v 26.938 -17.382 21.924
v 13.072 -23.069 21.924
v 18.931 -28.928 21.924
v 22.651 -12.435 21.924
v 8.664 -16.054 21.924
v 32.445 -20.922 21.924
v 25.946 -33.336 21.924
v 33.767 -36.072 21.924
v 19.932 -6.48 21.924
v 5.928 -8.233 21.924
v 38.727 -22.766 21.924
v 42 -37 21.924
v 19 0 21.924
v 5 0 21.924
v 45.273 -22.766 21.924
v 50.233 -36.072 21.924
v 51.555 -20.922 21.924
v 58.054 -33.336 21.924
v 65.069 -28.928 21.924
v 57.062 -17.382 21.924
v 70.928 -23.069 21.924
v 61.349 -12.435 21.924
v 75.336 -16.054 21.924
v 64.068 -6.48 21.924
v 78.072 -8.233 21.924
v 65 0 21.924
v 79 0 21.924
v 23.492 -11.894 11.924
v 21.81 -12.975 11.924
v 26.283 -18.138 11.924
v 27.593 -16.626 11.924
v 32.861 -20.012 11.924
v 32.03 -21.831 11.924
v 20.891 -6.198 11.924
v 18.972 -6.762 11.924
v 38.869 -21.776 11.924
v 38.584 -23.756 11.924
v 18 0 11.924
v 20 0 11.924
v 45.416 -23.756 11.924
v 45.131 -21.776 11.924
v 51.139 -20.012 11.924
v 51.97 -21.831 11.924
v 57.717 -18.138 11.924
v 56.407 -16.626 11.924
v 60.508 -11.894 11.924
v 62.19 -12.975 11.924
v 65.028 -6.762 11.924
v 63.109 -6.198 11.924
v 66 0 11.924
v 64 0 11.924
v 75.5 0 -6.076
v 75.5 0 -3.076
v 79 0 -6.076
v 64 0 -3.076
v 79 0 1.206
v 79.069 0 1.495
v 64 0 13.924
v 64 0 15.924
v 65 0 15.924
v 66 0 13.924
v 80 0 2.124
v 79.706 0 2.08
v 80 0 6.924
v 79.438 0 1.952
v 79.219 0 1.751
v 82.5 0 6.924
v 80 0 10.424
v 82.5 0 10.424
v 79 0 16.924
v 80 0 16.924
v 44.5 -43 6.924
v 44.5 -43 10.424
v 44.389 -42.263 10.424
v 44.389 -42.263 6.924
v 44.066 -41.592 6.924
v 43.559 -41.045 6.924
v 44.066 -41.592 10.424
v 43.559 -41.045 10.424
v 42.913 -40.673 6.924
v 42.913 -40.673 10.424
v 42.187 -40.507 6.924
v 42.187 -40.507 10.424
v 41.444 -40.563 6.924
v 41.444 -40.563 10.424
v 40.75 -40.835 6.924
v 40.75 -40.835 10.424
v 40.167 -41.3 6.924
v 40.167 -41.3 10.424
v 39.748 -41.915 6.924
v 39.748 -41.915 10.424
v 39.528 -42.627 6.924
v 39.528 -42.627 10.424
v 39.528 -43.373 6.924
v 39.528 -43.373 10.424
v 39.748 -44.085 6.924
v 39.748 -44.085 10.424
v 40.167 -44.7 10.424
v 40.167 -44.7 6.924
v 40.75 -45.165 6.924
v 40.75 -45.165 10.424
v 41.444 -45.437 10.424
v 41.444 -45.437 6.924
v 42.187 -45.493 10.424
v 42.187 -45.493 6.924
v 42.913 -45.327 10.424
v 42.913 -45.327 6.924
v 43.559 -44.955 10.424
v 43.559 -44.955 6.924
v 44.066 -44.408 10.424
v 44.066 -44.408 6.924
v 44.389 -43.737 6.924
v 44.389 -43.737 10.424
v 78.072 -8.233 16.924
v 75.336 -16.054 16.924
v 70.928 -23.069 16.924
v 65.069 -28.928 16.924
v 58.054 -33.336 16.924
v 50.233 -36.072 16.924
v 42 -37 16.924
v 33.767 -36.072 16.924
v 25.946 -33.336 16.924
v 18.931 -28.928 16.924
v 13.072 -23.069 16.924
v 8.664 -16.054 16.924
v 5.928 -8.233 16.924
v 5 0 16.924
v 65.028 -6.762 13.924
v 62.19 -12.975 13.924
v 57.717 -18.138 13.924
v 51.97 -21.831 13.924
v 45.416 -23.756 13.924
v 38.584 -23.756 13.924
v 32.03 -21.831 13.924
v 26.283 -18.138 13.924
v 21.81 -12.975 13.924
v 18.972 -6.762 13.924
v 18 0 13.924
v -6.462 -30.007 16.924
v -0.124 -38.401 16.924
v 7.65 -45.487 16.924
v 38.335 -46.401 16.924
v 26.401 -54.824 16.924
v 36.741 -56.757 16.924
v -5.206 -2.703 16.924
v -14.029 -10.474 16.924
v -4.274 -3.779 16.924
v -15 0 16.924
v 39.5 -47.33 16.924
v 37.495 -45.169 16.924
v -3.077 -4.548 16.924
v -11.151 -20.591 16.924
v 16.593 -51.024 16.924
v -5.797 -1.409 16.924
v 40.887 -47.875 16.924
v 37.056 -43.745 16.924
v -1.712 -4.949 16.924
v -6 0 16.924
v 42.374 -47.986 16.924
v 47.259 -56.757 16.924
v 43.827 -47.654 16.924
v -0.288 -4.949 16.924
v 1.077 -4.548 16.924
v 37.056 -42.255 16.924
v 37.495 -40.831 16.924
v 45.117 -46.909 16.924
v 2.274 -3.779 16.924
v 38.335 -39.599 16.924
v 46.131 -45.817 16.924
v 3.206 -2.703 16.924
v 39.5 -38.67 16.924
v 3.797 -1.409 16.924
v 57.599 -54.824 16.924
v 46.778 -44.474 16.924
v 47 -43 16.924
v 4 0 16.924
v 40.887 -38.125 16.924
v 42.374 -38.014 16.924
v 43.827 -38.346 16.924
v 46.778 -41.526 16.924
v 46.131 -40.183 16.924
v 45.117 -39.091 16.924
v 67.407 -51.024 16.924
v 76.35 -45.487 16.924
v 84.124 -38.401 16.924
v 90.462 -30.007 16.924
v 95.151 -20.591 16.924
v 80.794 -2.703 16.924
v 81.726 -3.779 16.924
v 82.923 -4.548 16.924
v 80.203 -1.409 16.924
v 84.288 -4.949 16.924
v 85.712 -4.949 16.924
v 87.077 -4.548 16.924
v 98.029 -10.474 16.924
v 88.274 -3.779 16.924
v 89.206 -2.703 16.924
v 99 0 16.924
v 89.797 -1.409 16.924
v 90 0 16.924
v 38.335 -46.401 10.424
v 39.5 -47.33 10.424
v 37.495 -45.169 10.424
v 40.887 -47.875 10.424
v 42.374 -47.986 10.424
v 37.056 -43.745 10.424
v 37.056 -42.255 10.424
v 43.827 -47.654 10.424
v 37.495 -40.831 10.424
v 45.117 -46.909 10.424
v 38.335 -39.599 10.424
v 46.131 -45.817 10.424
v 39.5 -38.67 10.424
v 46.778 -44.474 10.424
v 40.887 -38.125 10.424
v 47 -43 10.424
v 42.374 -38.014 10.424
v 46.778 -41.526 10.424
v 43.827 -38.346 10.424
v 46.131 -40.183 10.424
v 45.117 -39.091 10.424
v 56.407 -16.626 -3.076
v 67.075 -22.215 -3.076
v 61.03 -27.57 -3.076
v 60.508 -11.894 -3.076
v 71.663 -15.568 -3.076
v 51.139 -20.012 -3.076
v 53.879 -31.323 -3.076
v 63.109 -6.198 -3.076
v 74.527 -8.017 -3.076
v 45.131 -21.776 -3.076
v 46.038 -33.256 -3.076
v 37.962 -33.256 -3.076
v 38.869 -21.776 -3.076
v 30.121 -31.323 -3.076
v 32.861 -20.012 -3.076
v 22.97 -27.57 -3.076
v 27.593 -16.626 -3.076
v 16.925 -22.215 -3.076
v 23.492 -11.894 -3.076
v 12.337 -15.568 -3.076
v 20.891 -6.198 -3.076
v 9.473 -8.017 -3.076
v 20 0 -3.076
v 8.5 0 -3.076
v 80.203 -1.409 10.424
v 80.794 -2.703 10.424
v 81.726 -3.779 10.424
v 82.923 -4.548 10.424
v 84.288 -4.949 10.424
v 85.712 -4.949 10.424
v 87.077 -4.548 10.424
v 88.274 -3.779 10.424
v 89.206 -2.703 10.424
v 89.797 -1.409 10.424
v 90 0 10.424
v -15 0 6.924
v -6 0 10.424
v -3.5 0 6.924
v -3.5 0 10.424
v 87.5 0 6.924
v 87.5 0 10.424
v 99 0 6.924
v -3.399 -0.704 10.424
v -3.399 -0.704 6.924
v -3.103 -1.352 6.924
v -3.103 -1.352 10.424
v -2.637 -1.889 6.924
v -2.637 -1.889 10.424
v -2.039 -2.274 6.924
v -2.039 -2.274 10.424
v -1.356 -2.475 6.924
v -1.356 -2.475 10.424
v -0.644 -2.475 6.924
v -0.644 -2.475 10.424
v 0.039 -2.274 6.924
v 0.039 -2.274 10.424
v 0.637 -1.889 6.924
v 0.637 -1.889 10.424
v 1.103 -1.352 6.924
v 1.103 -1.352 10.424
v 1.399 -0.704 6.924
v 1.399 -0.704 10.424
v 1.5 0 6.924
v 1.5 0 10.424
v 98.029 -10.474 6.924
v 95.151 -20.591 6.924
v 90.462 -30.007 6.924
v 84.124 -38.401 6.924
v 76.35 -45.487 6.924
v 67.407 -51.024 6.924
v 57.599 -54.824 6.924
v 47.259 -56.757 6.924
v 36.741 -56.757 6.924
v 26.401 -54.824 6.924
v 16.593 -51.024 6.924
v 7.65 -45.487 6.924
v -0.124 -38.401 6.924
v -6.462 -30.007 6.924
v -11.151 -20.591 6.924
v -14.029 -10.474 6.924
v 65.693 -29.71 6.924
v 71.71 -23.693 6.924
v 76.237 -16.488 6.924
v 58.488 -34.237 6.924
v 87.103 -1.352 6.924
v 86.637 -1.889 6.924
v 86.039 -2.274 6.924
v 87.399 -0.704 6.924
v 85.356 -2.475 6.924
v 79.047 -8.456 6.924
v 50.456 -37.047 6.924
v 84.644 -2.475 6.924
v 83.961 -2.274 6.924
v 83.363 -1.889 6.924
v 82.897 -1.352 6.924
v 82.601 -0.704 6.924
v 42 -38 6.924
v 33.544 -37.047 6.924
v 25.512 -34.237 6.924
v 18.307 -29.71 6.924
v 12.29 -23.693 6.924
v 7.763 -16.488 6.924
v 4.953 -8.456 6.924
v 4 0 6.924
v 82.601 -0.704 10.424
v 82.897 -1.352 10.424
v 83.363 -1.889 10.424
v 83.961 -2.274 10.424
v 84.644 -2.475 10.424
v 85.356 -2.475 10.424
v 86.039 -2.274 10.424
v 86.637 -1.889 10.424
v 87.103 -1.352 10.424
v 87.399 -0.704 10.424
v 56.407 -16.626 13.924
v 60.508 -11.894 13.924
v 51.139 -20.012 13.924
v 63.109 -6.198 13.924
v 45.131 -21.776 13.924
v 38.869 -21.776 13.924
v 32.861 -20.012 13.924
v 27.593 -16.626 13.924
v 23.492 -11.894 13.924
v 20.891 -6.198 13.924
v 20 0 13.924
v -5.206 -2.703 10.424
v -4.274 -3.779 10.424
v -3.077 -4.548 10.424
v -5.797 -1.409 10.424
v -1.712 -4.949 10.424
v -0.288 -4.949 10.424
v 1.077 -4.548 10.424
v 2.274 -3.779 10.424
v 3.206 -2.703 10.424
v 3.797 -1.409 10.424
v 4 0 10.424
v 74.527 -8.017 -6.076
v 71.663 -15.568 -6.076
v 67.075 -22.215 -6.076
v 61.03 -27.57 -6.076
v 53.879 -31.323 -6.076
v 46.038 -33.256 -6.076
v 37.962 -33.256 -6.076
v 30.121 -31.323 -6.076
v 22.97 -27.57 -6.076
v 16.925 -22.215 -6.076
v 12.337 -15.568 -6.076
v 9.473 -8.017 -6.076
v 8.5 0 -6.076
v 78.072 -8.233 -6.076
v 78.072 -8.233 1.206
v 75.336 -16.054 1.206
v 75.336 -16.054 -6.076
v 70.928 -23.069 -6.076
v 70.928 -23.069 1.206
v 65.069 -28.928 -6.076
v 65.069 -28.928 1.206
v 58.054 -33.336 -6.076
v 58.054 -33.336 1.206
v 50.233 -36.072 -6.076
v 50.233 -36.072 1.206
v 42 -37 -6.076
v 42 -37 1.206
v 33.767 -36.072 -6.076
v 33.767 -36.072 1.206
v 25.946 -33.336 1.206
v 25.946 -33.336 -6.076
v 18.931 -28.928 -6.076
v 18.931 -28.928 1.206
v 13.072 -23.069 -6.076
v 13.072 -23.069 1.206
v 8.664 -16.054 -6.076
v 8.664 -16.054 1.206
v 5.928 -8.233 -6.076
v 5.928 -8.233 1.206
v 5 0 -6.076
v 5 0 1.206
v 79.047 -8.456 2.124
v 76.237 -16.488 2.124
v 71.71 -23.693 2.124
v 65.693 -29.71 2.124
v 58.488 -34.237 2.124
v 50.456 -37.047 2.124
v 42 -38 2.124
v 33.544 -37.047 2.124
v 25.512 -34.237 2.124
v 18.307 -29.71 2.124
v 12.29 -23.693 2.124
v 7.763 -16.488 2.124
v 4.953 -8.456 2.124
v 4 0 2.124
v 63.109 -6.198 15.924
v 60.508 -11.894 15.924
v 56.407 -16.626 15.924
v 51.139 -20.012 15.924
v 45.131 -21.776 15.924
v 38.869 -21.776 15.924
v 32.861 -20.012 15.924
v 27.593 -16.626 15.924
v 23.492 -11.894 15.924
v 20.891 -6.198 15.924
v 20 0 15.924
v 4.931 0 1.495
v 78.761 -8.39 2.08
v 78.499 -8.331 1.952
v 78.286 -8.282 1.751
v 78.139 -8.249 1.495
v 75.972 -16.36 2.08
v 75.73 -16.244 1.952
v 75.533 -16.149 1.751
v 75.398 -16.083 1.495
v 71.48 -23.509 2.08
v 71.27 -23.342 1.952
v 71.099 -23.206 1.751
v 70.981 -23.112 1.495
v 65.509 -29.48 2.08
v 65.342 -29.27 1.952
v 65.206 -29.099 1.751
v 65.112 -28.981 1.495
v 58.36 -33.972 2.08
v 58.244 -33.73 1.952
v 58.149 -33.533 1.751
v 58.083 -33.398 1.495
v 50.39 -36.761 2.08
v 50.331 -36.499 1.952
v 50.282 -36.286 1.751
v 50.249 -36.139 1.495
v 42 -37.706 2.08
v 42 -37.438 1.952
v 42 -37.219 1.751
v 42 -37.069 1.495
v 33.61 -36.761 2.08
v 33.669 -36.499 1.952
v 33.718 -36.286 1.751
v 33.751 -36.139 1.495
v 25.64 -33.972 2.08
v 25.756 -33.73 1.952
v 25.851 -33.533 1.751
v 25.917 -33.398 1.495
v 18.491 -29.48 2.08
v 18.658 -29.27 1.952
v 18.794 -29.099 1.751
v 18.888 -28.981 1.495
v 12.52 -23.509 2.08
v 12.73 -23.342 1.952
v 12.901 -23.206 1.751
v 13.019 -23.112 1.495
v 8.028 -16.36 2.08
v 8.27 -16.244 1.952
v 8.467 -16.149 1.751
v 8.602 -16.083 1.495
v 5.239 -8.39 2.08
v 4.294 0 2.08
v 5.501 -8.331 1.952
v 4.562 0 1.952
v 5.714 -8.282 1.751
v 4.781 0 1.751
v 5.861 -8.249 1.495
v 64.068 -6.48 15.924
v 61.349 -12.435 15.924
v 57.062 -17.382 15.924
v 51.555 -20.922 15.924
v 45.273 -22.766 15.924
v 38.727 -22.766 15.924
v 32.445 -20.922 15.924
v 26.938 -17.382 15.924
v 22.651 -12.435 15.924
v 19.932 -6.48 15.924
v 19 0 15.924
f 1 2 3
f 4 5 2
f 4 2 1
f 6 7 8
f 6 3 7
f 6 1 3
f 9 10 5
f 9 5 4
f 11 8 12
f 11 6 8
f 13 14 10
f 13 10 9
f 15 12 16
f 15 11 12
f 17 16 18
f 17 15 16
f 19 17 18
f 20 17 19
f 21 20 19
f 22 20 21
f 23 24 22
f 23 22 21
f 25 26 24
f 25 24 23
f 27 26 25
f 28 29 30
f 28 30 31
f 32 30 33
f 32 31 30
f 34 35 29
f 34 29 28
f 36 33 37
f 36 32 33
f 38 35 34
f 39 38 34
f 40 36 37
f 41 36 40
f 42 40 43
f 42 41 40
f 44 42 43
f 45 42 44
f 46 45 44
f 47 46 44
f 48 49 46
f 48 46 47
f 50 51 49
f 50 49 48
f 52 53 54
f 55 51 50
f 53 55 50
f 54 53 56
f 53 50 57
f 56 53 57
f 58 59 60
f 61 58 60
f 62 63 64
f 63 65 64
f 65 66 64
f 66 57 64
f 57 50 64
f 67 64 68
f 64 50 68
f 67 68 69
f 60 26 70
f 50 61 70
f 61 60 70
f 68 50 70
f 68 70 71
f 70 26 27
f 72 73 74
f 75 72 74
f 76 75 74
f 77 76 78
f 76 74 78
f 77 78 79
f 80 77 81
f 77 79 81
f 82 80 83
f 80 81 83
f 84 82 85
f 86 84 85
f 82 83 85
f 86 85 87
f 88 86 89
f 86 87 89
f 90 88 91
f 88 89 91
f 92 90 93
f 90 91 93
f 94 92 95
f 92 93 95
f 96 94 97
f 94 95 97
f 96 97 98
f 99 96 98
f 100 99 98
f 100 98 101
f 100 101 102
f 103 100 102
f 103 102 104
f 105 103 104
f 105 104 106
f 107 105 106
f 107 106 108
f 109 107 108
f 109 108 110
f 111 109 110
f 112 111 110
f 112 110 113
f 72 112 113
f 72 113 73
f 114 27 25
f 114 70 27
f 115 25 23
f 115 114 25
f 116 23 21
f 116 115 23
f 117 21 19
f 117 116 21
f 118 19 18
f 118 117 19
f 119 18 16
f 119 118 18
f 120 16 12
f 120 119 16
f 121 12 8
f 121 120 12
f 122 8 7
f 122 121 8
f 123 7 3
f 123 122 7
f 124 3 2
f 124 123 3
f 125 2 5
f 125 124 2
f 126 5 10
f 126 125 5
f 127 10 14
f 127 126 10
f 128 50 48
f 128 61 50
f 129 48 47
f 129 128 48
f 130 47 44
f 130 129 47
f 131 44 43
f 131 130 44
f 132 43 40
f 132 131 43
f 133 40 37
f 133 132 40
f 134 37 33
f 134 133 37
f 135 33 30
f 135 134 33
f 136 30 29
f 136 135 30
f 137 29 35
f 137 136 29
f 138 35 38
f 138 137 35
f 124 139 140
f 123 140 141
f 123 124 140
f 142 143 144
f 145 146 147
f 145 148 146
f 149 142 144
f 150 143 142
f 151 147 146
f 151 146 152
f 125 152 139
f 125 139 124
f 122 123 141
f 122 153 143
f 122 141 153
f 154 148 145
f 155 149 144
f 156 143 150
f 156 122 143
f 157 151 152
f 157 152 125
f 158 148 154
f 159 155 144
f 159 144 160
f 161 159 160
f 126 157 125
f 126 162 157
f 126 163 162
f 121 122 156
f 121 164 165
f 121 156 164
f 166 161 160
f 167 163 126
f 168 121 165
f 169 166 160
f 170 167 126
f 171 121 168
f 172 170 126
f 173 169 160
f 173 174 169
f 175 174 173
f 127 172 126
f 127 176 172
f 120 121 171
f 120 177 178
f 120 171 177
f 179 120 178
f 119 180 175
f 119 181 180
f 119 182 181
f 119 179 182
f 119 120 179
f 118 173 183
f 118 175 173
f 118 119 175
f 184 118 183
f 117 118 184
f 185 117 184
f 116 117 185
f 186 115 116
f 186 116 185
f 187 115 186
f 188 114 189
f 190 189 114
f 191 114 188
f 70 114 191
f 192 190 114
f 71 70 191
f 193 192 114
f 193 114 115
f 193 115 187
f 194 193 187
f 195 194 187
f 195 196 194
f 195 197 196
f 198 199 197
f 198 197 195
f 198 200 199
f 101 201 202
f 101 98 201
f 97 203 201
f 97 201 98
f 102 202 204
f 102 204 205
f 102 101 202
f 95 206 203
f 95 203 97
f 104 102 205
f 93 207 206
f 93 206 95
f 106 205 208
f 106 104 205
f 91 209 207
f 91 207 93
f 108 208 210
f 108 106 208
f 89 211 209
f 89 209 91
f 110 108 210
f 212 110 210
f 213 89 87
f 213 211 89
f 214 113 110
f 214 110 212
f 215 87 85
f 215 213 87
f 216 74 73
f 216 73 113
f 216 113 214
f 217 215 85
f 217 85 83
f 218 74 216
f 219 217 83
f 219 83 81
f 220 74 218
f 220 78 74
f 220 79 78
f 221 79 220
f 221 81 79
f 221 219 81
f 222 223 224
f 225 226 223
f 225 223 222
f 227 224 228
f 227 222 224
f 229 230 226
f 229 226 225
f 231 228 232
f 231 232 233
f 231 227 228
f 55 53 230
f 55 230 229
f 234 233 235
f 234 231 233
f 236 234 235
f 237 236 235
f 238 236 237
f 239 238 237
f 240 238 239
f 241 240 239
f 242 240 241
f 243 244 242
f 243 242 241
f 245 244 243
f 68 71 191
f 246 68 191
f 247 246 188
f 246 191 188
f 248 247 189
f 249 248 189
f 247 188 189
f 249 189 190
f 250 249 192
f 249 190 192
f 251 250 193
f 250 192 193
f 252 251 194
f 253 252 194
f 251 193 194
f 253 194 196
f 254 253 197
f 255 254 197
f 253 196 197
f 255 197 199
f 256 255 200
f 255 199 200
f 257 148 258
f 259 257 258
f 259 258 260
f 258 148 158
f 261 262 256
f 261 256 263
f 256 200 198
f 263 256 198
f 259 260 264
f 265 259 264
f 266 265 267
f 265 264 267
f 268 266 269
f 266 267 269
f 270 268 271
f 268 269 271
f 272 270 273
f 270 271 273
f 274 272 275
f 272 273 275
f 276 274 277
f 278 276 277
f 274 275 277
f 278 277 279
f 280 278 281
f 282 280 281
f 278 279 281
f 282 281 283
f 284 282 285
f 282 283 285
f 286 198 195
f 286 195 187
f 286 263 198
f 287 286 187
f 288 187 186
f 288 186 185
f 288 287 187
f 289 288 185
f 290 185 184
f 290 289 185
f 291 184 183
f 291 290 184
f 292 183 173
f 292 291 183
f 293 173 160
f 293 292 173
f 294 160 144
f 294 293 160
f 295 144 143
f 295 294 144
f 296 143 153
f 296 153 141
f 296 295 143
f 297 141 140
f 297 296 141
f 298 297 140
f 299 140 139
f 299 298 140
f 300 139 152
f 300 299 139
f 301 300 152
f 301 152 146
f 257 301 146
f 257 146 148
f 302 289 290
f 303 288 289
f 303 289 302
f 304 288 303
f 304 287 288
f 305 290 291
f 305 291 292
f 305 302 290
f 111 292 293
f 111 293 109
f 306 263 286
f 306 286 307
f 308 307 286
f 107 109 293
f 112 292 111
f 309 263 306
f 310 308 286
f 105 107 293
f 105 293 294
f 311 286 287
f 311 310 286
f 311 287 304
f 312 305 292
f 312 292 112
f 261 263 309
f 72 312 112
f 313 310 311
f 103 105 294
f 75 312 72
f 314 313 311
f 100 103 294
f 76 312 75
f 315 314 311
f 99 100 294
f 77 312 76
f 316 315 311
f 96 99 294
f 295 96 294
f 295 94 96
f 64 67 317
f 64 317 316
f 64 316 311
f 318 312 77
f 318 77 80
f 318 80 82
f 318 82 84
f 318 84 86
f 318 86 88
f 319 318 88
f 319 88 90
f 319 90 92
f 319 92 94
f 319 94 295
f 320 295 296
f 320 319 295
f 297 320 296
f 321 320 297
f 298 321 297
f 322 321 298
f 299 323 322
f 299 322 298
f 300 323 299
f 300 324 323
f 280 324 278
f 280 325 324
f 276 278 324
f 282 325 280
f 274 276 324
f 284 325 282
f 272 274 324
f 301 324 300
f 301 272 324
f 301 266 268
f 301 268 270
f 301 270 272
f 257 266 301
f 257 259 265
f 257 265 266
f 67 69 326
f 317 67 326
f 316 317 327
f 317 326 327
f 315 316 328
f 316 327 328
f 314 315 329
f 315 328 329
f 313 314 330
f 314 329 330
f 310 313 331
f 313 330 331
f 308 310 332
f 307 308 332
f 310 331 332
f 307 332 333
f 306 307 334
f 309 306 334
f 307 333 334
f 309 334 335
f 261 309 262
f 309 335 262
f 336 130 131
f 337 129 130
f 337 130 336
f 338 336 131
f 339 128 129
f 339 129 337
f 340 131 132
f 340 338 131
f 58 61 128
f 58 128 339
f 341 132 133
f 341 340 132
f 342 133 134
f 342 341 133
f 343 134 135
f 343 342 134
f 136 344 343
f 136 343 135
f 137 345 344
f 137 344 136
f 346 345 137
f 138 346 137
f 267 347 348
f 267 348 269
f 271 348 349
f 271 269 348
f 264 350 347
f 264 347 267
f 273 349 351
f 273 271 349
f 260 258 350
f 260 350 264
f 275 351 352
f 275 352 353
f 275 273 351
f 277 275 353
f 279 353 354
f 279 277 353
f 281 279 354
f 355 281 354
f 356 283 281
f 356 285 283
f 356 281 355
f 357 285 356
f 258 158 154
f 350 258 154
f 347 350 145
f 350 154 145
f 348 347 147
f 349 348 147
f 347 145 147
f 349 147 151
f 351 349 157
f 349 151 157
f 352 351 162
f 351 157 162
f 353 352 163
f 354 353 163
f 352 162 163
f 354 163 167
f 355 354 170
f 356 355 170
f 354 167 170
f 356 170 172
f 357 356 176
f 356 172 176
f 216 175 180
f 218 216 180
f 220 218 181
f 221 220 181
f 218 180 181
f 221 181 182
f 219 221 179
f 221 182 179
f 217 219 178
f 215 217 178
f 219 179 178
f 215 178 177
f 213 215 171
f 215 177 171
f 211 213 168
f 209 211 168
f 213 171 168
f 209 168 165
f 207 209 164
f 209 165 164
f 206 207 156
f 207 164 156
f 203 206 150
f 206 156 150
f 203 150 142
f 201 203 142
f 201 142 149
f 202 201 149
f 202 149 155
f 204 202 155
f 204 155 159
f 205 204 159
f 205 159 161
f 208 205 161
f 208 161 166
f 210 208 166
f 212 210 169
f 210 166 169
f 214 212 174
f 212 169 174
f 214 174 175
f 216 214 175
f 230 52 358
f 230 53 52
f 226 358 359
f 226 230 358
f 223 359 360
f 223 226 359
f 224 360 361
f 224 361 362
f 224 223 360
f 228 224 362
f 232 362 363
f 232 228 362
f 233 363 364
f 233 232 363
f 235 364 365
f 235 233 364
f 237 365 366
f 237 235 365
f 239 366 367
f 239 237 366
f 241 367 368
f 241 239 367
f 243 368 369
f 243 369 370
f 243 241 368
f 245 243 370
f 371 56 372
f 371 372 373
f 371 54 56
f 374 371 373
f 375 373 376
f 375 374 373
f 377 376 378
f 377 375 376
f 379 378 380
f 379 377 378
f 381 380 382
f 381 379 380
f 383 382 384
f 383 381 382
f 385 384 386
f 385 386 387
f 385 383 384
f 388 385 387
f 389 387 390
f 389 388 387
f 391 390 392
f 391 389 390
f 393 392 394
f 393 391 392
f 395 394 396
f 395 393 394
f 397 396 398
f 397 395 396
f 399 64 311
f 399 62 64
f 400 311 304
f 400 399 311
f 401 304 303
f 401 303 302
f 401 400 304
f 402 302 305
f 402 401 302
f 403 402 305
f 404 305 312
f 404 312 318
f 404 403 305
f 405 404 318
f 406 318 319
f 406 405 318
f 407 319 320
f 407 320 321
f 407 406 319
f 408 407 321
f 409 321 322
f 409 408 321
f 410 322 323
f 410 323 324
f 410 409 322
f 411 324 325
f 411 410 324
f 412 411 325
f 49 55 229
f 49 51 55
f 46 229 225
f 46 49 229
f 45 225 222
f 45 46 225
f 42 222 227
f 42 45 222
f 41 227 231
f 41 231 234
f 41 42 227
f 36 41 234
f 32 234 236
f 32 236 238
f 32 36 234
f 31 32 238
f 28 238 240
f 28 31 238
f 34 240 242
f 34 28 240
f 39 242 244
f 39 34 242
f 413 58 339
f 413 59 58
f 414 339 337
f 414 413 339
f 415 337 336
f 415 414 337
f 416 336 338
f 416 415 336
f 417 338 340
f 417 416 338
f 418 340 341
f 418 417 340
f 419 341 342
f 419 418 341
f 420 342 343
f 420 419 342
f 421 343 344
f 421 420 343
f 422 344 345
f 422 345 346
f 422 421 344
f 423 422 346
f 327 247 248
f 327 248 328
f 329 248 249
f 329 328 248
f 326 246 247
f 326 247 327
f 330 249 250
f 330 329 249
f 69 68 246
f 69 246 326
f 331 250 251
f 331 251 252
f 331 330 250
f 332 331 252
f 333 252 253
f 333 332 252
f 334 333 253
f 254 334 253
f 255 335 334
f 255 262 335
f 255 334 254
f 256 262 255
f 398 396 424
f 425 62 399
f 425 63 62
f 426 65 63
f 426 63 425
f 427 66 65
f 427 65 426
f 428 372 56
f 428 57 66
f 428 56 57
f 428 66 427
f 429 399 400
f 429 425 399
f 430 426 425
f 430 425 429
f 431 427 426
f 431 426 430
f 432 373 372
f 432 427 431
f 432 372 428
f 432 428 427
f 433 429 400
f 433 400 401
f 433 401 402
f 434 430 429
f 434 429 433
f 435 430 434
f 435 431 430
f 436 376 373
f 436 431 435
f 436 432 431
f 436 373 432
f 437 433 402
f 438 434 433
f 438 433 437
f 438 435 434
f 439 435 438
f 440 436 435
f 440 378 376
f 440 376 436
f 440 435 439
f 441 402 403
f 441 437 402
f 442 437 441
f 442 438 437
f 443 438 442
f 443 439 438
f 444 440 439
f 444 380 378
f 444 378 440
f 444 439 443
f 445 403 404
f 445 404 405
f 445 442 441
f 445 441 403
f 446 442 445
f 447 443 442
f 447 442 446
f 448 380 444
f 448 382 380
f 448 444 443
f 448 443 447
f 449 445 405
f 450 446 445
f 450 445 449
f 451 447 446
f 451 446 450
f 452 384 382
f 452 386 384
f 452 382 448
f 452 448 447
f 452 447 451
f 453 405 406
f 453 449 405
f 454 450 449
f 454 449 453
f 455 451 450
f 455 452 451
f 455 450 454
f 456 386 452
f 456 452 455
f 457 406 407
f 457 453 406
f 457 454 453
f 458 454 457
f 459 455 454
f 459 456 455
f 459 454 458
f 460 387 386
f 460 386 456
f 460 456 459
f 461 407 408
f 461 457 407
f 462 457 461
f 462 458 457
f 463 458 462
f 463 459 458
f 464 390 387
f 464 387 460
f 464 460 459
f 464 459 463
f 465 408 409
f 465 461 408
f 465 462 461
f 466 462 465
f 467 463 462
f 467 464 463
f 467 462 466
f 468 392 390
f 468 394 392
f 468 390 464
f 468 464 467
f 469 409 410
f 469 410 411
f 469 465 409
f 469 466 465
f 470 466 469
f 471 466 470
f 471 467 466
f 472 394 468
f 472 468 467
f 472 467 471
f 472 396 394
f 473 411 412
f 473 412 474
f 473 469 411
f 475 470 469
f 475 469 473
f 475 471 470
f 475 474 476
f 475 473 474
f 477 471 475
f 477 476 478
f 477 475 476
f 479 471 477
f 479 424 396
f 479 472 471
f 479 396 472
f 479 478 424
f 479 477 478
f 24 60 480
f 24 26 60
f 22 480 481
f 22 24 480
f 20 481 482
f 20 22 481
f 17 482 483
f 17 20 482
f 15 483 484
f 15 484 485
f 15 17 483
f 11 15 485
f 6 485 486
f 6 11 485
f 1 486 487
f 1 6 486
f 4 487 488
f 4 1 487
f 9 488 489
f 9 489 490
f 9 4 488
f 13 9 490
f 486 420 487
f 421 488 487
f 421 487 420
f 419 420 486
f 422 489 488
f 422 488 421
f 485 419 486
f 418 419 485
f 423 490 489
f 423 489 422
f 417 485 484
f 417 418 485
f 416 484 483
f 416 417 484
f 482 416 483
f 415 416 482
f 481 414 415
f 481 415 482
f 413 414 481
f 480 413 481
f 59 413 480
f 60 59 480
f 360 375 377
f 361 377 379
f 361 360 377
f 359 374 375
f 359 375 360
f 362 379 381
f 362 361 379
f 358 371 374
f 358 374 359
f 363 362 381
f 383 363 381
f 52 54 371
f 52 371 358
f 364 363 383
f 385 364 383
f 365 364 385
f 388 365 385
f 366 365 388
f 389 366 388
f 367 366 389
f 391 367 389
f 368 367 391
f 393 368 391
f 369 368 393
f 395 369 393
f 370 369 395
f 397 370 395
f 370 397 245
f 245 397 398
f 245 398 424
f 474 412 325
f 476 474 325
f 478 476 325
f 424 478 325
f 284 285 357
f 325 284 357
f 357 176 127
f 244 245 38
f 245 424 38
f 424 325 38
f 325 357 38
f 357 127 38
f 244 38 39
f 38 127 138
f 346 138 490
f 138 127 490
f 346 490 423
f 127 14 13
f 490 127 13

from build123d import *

# Parameters (mm, degrees)
F2_R     = 2.5
F3_DEPTH = 23.001
F4_R     = 5
F4_R_2   = 2.5
F5_DEPTH = 6.5
F6_W     = 137.496356
F6_H     = 90.131391
F7_DEPTH = 57.001


with BuildPart() as f1:
    # F0 (on Front) → F1 (revolve)
    with BuildSketch(Plane.XZ):
        with BuildLine():
            Line((19, 21.923511), (5, 21.923511))
            Line((5, 21.923511), (5, 16.923511))
            Line((5, 16.923511), (-15, 16.923511))
            Line((-15, 16.923511), (-15, 6.923511))
            Line((-15, 6.923511), (4, 6.923511))
            Line((4, 6.923511), (4, 2.12446))
            ThreePointArc((4, 2.12446), (4.679018, 1.859872), (5, 1.205621))
            Line((5, 1.205621), (5, -6.076489))
            Line((5, -6.076489), (8.5, -6.076489))
            Line((8.5, -6.076489), (8.5, -3.076489))
            Line((8.5, -3.076489), (20, -3.076489))
            Line((20, -3.076489), (20, 11.923511))
            Line((20, 11.923511), (18, 11.923511))
            Line((18, 11.923511), (18, 13.923511))
            Line((18, 13.923511), (20, 13.923511))
            Line((20, 13.923511), (20, 15.923511))
            Line((20, 15.923511), (19, 15.923511))
            Line((19, 15.923511), (19, 21.923511))
        make_face()
    revolve(axis=Axis((42, 0, 16.450874), (0, 0, -1)))

    # F2 (on face) → F3 (cut, through all)
    with BuildSketch(Plane.XY.offset(16.923511)):
        with Locations((-1, 0)):
            Circle(F2_R)
        with Locations((85, 0)):
            Circle(F2_R)
        with Locations((42, 43)):
            Circle(F2_R)
        with Locations((42, -43)):
            Circle(F2_R)
    extrude(amount=-F3_DEPTH, mode=Mode.SUBTRACT)

    # F4 (on face) → F5 (cut)
    with BuildSketch(Plane.XY.offset(16.923511)):
        with Locations((-1, 0)):
            Circle(F4_R)
        with Locations((-1, 0)):
            Circle(F4_R_2, mode=Mode.SUBTRACT)
        with Locations((42, 43)):
            Circle(F4_R)
        with Locations((42, 43)):
            Circle(F4_R_2, mode=Mode.SUBTRACT)
        with Locations((85, 0)):
            Circle(F4_R)
        with Locations((85, 0)):
            Circle(F4_R_2, mode=Mode.SUBTRACT)
        with Locations((42, -43)):
            Circle(F4_R)
        with Locations((42, -43)):
            Circle(F4_R_2, mode=Mode.SUBTRACT)
    extrude(amount=-F5_DEPTH, mode=Mode.SUBTRACT)

    # F6 (on Front) → F7 (cut, through all)
    with BuildSketch(Plane.XZ):
        with Locations((31.107662, 6.20803)):
            Rectangle(F6_W, F6_H)
    extrude(amount=-F7_DEPTH, mode=Mode.SUBTRACT)


solid = f1.part
